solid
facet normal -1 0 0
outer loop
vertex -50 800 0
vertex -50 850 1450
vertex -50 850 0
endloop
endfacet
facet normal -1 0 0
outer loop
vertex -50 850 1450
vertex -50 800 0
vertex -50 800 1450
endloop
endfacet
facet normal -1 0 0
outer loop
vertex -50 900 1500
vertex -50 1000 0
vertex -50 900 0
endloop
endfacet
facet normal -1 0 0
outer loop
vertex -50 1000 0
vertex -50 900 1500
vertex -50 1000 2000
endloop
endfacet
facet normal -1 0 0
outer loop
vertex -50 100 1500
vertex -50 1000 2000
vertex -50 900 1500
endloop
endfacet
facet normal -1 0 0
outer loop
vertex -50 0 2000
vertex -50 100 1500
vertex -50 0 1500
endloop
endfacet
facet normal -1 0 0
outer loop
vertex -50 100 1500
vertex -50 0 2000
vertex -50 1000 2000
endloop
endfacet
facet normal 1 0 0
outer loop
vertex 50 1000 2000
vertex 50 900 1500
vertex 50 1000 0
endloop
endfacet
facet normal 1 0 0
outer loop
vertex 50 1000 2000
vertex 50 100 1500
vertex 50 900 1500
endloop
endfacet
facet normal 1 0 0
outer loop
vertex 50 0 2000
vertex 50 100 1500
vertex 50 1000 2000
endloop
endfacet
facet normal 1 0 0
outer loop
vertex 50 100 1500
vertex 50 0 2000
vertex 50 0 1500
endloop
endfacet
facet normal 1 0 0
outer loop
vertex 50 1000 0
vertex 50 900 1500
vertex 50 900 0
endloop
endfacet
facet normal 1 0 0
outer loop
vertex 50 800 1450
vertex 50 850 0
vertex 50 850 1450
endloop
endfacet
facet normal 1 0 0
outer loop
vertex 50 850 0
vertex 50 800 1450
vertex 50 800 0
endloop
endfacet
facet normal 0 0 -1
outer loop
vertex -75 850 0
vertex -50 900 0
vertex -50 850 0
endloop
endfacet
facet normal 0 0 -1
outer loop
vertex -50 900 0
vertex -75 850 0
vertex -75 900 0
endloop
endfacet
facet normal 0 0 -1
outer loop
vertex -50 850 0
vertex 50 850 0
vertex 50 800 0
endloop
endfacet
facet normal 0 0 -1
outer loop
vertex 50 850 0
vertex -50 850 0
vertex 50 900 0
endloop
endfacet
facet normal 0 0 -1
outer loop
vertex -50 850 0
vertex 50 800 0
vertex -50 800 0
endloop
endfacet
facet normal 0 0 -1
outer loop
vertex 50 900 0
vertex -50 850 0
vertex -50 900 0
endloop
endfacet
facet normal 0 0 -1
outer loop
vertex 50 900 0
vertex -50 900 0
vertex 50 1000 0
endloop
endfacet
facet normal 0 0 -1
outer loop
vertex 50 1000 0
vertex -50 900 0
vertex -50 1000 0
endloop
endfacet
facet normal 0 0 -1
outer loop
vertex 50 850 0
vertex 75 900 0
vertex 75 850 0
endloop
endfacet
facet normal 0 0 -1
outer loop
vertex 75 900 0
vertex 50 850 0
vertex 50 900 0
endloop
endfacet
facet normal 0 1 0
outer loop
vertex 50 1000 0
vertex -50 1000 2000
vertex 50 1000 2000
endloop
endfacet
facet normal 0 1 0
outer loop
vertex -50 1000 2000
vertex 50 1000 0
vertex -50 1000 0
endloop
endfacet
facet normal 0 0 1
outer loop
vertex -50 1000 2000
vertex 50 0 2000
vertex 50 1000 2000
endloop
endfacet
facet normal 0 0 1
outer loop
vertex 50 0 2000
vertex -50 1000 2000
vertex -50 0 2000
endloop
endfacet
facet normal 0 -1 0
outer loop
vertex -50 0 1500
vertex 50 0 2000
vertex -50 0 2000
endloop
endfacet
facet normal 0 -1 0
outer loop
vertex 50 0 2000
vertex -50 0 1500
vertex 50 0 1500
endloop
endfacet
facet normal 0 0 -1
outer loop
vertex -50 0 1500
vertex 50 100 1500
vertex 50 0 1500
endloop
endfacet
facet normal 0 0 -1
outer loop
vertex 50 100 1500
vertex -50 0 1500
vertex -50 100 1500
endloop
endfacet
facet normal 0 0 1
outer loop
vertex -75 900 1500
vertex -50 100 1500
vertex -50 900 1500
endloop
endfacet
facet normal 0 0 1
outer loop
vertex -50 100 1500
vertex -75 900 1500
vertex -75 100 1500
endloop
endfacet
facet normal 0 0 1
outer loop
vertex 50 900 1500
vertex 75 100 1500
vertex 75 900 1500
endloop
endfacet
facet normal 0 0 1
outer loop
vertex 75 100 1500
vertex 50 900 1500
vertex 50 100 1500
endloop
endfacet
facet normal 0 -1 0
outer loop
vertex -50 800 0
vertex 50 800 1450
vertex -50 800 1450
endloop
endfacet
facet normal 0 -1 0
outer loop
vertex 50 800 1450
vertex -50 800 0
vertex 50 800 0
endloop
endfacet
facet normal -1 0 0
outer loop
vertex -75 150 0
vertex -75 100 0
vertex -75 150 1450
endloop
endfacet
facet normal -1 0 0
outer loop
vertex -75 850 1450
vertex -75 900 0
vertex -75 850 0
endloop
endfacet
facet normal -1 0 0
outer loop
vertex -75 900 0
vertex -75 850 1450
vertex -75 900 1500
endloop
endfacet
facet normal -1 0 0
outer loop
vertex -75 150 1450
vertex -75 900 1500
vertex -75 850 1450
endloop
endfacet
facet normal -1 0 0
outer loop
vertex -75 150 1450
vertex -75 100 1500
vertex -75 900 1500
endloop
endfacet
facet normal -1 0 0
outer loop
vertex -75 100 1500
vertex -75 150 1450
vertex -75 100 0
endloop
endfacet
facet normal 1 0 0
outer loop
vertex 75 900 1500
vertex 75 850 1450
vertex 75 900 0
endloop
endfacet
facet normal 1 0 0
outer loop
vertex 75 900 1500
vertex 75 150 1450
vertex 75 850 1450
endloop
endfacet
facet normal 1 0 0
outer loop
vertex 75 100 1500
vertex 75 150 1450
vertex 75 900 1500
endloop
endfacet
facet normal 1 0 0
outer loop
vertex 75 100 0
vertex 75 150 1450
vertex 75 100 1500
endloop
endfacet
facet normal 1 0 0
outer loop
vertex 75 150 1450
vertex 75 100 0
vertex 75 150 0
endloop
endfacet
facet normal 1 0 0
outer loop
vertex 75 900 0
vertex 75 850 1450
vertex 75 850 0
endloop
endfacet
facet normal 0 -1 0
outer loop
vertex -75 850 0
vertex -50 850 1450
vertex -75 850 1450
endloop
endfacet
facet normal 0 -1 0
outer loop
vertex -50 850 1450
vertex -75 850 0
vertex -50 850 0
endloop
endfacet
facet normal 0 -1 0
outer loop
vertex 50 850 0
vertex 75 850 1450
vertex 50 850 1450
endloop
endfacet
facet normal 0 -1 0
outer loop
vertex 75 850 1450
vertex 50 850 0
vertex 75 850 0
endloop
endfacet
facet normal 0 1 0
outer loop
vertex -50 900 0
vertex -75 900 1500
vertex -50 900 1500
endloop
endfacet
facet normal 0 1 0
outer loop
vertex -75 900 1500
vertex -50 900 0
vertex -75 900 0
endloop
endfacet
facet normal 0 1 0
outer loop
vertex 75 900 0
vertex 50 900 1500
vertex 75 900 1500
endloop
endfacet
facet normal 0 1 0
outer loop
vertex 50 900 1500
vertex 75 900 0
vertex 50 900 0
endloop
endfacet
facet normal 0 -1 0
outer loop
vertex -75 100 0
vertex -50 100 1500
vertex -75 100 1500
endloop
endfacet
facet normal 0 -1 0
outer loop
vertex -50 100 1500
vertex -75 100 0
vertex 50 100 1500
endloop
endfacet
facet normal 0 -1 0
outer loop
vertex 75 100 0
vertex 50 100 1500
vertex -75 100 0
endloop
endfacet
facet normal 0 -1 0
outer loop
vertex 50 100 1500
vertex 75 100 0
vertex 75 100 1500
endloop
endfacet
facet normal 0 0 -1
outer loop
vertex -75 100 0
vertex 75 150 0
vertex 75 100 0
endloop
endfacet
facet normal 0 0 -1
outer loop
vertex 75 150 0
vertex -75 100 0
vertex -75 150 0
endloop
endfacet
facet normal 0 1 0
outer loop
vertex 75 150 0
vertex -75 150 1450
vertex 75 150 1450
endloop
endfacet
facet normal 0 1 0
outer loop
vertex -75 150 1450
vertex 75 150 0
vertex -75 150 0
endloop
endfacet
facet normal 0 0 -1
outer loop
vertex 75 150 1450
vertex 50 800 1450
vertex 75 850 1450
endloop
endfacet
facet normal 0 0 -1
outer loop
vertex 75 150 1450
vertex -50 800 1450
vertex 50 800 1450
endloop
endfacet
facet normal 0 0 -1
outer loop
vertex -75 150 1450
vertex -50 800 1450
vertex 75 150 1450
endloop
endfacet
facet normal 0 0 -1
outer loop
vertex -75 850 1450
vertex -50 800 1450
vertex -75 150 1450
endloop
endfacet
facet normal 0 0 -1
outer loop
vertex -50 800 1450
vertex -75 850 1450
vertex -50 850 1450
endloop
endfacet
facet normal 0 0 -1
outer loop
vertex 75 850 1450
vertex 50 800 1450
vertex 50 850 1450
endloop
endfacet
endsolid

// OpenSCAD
// file: ../../../libs/templates/t_door.scad
include <../basic-dims.scad>

simple_door_door_width = section_width * 0.8;
simple_door_door_height = section_height * 0.75;

module door_sketch(offset = 0) {
    difference() {
        square([section_width, section_height]);

        translate([section_width/2 - simple_door_door_width/2 - offset, 0, 0])
        square([simple_door_door_width, simple_door_door_height]);
    }   
}

module door() {
    rotate([90, 0, 90])
    translate([0, 0, -section_thickness/2])
    linear_extrude(section_thickness)
    door_sketch();
}

module door_offset() {
    rotate([90, 0, 90])
    translate([0, 0, -section_thickness/2])
    linear_extrude(section_thickness)
    door_sketch(-simple_door_door_width/2 + section_width/2);
}
// file: ../../../libs/basic-dims.scad
unit = 1000;

section_width = unit;
section_height = unit * 2;
section_thickness = unit * 0.1;

rt = sqrt(2);

//  -- Notes --
//  Z is UP
//  X is FORWARD (out of the screen)
// file: ../../../libs/templates/t_door-frame.scad
include <../basic-dims.scad>
include <./t_door.scad>

door_frame_frame_thickness = unit / 20;
door_frame_frame_depth = section_thickness + unit/20;

door_frame_frame_inner_width = simple_door_door_width - door_frame_frame_thickness*2;
door_frame_frame_inner_height = simple_door_door_height - door_frame_frame_thickness;

module door_frame_sketch() {
    difference() {
        square([simple_door_door_width, simple_door_door_height]);

        translate([door_frame_frame_thickness, 0, 0])
        square([simple_door_door_width - door_frame_frame_thickness*2, simple_door_door_height - door_frame_frame_thickness]);
    }
}

module door_frame() {
    translate([0, section_width/2-simple_door_door_width/2, 0])
    translate([-door_frame_frame_depth/2, 0, 0])
    rotate([90, 0, 90])
    linear_extrude(door_frame_frame_depth)
    door_frame_sketch();
}

module door_frame_offset() {
    translate([0, 0, 0])
    translate([-door_frame_frame_depth/2, 0, 0])
    rotate([90, 0, 90])
    linear_extrude(door_frame_frame_depth)
    door_frame_sketch();
}

%door_frame_offset();
door_offset();
// main file
include <../../../libs/templates/t_door-frame.scad>

door_frame();
